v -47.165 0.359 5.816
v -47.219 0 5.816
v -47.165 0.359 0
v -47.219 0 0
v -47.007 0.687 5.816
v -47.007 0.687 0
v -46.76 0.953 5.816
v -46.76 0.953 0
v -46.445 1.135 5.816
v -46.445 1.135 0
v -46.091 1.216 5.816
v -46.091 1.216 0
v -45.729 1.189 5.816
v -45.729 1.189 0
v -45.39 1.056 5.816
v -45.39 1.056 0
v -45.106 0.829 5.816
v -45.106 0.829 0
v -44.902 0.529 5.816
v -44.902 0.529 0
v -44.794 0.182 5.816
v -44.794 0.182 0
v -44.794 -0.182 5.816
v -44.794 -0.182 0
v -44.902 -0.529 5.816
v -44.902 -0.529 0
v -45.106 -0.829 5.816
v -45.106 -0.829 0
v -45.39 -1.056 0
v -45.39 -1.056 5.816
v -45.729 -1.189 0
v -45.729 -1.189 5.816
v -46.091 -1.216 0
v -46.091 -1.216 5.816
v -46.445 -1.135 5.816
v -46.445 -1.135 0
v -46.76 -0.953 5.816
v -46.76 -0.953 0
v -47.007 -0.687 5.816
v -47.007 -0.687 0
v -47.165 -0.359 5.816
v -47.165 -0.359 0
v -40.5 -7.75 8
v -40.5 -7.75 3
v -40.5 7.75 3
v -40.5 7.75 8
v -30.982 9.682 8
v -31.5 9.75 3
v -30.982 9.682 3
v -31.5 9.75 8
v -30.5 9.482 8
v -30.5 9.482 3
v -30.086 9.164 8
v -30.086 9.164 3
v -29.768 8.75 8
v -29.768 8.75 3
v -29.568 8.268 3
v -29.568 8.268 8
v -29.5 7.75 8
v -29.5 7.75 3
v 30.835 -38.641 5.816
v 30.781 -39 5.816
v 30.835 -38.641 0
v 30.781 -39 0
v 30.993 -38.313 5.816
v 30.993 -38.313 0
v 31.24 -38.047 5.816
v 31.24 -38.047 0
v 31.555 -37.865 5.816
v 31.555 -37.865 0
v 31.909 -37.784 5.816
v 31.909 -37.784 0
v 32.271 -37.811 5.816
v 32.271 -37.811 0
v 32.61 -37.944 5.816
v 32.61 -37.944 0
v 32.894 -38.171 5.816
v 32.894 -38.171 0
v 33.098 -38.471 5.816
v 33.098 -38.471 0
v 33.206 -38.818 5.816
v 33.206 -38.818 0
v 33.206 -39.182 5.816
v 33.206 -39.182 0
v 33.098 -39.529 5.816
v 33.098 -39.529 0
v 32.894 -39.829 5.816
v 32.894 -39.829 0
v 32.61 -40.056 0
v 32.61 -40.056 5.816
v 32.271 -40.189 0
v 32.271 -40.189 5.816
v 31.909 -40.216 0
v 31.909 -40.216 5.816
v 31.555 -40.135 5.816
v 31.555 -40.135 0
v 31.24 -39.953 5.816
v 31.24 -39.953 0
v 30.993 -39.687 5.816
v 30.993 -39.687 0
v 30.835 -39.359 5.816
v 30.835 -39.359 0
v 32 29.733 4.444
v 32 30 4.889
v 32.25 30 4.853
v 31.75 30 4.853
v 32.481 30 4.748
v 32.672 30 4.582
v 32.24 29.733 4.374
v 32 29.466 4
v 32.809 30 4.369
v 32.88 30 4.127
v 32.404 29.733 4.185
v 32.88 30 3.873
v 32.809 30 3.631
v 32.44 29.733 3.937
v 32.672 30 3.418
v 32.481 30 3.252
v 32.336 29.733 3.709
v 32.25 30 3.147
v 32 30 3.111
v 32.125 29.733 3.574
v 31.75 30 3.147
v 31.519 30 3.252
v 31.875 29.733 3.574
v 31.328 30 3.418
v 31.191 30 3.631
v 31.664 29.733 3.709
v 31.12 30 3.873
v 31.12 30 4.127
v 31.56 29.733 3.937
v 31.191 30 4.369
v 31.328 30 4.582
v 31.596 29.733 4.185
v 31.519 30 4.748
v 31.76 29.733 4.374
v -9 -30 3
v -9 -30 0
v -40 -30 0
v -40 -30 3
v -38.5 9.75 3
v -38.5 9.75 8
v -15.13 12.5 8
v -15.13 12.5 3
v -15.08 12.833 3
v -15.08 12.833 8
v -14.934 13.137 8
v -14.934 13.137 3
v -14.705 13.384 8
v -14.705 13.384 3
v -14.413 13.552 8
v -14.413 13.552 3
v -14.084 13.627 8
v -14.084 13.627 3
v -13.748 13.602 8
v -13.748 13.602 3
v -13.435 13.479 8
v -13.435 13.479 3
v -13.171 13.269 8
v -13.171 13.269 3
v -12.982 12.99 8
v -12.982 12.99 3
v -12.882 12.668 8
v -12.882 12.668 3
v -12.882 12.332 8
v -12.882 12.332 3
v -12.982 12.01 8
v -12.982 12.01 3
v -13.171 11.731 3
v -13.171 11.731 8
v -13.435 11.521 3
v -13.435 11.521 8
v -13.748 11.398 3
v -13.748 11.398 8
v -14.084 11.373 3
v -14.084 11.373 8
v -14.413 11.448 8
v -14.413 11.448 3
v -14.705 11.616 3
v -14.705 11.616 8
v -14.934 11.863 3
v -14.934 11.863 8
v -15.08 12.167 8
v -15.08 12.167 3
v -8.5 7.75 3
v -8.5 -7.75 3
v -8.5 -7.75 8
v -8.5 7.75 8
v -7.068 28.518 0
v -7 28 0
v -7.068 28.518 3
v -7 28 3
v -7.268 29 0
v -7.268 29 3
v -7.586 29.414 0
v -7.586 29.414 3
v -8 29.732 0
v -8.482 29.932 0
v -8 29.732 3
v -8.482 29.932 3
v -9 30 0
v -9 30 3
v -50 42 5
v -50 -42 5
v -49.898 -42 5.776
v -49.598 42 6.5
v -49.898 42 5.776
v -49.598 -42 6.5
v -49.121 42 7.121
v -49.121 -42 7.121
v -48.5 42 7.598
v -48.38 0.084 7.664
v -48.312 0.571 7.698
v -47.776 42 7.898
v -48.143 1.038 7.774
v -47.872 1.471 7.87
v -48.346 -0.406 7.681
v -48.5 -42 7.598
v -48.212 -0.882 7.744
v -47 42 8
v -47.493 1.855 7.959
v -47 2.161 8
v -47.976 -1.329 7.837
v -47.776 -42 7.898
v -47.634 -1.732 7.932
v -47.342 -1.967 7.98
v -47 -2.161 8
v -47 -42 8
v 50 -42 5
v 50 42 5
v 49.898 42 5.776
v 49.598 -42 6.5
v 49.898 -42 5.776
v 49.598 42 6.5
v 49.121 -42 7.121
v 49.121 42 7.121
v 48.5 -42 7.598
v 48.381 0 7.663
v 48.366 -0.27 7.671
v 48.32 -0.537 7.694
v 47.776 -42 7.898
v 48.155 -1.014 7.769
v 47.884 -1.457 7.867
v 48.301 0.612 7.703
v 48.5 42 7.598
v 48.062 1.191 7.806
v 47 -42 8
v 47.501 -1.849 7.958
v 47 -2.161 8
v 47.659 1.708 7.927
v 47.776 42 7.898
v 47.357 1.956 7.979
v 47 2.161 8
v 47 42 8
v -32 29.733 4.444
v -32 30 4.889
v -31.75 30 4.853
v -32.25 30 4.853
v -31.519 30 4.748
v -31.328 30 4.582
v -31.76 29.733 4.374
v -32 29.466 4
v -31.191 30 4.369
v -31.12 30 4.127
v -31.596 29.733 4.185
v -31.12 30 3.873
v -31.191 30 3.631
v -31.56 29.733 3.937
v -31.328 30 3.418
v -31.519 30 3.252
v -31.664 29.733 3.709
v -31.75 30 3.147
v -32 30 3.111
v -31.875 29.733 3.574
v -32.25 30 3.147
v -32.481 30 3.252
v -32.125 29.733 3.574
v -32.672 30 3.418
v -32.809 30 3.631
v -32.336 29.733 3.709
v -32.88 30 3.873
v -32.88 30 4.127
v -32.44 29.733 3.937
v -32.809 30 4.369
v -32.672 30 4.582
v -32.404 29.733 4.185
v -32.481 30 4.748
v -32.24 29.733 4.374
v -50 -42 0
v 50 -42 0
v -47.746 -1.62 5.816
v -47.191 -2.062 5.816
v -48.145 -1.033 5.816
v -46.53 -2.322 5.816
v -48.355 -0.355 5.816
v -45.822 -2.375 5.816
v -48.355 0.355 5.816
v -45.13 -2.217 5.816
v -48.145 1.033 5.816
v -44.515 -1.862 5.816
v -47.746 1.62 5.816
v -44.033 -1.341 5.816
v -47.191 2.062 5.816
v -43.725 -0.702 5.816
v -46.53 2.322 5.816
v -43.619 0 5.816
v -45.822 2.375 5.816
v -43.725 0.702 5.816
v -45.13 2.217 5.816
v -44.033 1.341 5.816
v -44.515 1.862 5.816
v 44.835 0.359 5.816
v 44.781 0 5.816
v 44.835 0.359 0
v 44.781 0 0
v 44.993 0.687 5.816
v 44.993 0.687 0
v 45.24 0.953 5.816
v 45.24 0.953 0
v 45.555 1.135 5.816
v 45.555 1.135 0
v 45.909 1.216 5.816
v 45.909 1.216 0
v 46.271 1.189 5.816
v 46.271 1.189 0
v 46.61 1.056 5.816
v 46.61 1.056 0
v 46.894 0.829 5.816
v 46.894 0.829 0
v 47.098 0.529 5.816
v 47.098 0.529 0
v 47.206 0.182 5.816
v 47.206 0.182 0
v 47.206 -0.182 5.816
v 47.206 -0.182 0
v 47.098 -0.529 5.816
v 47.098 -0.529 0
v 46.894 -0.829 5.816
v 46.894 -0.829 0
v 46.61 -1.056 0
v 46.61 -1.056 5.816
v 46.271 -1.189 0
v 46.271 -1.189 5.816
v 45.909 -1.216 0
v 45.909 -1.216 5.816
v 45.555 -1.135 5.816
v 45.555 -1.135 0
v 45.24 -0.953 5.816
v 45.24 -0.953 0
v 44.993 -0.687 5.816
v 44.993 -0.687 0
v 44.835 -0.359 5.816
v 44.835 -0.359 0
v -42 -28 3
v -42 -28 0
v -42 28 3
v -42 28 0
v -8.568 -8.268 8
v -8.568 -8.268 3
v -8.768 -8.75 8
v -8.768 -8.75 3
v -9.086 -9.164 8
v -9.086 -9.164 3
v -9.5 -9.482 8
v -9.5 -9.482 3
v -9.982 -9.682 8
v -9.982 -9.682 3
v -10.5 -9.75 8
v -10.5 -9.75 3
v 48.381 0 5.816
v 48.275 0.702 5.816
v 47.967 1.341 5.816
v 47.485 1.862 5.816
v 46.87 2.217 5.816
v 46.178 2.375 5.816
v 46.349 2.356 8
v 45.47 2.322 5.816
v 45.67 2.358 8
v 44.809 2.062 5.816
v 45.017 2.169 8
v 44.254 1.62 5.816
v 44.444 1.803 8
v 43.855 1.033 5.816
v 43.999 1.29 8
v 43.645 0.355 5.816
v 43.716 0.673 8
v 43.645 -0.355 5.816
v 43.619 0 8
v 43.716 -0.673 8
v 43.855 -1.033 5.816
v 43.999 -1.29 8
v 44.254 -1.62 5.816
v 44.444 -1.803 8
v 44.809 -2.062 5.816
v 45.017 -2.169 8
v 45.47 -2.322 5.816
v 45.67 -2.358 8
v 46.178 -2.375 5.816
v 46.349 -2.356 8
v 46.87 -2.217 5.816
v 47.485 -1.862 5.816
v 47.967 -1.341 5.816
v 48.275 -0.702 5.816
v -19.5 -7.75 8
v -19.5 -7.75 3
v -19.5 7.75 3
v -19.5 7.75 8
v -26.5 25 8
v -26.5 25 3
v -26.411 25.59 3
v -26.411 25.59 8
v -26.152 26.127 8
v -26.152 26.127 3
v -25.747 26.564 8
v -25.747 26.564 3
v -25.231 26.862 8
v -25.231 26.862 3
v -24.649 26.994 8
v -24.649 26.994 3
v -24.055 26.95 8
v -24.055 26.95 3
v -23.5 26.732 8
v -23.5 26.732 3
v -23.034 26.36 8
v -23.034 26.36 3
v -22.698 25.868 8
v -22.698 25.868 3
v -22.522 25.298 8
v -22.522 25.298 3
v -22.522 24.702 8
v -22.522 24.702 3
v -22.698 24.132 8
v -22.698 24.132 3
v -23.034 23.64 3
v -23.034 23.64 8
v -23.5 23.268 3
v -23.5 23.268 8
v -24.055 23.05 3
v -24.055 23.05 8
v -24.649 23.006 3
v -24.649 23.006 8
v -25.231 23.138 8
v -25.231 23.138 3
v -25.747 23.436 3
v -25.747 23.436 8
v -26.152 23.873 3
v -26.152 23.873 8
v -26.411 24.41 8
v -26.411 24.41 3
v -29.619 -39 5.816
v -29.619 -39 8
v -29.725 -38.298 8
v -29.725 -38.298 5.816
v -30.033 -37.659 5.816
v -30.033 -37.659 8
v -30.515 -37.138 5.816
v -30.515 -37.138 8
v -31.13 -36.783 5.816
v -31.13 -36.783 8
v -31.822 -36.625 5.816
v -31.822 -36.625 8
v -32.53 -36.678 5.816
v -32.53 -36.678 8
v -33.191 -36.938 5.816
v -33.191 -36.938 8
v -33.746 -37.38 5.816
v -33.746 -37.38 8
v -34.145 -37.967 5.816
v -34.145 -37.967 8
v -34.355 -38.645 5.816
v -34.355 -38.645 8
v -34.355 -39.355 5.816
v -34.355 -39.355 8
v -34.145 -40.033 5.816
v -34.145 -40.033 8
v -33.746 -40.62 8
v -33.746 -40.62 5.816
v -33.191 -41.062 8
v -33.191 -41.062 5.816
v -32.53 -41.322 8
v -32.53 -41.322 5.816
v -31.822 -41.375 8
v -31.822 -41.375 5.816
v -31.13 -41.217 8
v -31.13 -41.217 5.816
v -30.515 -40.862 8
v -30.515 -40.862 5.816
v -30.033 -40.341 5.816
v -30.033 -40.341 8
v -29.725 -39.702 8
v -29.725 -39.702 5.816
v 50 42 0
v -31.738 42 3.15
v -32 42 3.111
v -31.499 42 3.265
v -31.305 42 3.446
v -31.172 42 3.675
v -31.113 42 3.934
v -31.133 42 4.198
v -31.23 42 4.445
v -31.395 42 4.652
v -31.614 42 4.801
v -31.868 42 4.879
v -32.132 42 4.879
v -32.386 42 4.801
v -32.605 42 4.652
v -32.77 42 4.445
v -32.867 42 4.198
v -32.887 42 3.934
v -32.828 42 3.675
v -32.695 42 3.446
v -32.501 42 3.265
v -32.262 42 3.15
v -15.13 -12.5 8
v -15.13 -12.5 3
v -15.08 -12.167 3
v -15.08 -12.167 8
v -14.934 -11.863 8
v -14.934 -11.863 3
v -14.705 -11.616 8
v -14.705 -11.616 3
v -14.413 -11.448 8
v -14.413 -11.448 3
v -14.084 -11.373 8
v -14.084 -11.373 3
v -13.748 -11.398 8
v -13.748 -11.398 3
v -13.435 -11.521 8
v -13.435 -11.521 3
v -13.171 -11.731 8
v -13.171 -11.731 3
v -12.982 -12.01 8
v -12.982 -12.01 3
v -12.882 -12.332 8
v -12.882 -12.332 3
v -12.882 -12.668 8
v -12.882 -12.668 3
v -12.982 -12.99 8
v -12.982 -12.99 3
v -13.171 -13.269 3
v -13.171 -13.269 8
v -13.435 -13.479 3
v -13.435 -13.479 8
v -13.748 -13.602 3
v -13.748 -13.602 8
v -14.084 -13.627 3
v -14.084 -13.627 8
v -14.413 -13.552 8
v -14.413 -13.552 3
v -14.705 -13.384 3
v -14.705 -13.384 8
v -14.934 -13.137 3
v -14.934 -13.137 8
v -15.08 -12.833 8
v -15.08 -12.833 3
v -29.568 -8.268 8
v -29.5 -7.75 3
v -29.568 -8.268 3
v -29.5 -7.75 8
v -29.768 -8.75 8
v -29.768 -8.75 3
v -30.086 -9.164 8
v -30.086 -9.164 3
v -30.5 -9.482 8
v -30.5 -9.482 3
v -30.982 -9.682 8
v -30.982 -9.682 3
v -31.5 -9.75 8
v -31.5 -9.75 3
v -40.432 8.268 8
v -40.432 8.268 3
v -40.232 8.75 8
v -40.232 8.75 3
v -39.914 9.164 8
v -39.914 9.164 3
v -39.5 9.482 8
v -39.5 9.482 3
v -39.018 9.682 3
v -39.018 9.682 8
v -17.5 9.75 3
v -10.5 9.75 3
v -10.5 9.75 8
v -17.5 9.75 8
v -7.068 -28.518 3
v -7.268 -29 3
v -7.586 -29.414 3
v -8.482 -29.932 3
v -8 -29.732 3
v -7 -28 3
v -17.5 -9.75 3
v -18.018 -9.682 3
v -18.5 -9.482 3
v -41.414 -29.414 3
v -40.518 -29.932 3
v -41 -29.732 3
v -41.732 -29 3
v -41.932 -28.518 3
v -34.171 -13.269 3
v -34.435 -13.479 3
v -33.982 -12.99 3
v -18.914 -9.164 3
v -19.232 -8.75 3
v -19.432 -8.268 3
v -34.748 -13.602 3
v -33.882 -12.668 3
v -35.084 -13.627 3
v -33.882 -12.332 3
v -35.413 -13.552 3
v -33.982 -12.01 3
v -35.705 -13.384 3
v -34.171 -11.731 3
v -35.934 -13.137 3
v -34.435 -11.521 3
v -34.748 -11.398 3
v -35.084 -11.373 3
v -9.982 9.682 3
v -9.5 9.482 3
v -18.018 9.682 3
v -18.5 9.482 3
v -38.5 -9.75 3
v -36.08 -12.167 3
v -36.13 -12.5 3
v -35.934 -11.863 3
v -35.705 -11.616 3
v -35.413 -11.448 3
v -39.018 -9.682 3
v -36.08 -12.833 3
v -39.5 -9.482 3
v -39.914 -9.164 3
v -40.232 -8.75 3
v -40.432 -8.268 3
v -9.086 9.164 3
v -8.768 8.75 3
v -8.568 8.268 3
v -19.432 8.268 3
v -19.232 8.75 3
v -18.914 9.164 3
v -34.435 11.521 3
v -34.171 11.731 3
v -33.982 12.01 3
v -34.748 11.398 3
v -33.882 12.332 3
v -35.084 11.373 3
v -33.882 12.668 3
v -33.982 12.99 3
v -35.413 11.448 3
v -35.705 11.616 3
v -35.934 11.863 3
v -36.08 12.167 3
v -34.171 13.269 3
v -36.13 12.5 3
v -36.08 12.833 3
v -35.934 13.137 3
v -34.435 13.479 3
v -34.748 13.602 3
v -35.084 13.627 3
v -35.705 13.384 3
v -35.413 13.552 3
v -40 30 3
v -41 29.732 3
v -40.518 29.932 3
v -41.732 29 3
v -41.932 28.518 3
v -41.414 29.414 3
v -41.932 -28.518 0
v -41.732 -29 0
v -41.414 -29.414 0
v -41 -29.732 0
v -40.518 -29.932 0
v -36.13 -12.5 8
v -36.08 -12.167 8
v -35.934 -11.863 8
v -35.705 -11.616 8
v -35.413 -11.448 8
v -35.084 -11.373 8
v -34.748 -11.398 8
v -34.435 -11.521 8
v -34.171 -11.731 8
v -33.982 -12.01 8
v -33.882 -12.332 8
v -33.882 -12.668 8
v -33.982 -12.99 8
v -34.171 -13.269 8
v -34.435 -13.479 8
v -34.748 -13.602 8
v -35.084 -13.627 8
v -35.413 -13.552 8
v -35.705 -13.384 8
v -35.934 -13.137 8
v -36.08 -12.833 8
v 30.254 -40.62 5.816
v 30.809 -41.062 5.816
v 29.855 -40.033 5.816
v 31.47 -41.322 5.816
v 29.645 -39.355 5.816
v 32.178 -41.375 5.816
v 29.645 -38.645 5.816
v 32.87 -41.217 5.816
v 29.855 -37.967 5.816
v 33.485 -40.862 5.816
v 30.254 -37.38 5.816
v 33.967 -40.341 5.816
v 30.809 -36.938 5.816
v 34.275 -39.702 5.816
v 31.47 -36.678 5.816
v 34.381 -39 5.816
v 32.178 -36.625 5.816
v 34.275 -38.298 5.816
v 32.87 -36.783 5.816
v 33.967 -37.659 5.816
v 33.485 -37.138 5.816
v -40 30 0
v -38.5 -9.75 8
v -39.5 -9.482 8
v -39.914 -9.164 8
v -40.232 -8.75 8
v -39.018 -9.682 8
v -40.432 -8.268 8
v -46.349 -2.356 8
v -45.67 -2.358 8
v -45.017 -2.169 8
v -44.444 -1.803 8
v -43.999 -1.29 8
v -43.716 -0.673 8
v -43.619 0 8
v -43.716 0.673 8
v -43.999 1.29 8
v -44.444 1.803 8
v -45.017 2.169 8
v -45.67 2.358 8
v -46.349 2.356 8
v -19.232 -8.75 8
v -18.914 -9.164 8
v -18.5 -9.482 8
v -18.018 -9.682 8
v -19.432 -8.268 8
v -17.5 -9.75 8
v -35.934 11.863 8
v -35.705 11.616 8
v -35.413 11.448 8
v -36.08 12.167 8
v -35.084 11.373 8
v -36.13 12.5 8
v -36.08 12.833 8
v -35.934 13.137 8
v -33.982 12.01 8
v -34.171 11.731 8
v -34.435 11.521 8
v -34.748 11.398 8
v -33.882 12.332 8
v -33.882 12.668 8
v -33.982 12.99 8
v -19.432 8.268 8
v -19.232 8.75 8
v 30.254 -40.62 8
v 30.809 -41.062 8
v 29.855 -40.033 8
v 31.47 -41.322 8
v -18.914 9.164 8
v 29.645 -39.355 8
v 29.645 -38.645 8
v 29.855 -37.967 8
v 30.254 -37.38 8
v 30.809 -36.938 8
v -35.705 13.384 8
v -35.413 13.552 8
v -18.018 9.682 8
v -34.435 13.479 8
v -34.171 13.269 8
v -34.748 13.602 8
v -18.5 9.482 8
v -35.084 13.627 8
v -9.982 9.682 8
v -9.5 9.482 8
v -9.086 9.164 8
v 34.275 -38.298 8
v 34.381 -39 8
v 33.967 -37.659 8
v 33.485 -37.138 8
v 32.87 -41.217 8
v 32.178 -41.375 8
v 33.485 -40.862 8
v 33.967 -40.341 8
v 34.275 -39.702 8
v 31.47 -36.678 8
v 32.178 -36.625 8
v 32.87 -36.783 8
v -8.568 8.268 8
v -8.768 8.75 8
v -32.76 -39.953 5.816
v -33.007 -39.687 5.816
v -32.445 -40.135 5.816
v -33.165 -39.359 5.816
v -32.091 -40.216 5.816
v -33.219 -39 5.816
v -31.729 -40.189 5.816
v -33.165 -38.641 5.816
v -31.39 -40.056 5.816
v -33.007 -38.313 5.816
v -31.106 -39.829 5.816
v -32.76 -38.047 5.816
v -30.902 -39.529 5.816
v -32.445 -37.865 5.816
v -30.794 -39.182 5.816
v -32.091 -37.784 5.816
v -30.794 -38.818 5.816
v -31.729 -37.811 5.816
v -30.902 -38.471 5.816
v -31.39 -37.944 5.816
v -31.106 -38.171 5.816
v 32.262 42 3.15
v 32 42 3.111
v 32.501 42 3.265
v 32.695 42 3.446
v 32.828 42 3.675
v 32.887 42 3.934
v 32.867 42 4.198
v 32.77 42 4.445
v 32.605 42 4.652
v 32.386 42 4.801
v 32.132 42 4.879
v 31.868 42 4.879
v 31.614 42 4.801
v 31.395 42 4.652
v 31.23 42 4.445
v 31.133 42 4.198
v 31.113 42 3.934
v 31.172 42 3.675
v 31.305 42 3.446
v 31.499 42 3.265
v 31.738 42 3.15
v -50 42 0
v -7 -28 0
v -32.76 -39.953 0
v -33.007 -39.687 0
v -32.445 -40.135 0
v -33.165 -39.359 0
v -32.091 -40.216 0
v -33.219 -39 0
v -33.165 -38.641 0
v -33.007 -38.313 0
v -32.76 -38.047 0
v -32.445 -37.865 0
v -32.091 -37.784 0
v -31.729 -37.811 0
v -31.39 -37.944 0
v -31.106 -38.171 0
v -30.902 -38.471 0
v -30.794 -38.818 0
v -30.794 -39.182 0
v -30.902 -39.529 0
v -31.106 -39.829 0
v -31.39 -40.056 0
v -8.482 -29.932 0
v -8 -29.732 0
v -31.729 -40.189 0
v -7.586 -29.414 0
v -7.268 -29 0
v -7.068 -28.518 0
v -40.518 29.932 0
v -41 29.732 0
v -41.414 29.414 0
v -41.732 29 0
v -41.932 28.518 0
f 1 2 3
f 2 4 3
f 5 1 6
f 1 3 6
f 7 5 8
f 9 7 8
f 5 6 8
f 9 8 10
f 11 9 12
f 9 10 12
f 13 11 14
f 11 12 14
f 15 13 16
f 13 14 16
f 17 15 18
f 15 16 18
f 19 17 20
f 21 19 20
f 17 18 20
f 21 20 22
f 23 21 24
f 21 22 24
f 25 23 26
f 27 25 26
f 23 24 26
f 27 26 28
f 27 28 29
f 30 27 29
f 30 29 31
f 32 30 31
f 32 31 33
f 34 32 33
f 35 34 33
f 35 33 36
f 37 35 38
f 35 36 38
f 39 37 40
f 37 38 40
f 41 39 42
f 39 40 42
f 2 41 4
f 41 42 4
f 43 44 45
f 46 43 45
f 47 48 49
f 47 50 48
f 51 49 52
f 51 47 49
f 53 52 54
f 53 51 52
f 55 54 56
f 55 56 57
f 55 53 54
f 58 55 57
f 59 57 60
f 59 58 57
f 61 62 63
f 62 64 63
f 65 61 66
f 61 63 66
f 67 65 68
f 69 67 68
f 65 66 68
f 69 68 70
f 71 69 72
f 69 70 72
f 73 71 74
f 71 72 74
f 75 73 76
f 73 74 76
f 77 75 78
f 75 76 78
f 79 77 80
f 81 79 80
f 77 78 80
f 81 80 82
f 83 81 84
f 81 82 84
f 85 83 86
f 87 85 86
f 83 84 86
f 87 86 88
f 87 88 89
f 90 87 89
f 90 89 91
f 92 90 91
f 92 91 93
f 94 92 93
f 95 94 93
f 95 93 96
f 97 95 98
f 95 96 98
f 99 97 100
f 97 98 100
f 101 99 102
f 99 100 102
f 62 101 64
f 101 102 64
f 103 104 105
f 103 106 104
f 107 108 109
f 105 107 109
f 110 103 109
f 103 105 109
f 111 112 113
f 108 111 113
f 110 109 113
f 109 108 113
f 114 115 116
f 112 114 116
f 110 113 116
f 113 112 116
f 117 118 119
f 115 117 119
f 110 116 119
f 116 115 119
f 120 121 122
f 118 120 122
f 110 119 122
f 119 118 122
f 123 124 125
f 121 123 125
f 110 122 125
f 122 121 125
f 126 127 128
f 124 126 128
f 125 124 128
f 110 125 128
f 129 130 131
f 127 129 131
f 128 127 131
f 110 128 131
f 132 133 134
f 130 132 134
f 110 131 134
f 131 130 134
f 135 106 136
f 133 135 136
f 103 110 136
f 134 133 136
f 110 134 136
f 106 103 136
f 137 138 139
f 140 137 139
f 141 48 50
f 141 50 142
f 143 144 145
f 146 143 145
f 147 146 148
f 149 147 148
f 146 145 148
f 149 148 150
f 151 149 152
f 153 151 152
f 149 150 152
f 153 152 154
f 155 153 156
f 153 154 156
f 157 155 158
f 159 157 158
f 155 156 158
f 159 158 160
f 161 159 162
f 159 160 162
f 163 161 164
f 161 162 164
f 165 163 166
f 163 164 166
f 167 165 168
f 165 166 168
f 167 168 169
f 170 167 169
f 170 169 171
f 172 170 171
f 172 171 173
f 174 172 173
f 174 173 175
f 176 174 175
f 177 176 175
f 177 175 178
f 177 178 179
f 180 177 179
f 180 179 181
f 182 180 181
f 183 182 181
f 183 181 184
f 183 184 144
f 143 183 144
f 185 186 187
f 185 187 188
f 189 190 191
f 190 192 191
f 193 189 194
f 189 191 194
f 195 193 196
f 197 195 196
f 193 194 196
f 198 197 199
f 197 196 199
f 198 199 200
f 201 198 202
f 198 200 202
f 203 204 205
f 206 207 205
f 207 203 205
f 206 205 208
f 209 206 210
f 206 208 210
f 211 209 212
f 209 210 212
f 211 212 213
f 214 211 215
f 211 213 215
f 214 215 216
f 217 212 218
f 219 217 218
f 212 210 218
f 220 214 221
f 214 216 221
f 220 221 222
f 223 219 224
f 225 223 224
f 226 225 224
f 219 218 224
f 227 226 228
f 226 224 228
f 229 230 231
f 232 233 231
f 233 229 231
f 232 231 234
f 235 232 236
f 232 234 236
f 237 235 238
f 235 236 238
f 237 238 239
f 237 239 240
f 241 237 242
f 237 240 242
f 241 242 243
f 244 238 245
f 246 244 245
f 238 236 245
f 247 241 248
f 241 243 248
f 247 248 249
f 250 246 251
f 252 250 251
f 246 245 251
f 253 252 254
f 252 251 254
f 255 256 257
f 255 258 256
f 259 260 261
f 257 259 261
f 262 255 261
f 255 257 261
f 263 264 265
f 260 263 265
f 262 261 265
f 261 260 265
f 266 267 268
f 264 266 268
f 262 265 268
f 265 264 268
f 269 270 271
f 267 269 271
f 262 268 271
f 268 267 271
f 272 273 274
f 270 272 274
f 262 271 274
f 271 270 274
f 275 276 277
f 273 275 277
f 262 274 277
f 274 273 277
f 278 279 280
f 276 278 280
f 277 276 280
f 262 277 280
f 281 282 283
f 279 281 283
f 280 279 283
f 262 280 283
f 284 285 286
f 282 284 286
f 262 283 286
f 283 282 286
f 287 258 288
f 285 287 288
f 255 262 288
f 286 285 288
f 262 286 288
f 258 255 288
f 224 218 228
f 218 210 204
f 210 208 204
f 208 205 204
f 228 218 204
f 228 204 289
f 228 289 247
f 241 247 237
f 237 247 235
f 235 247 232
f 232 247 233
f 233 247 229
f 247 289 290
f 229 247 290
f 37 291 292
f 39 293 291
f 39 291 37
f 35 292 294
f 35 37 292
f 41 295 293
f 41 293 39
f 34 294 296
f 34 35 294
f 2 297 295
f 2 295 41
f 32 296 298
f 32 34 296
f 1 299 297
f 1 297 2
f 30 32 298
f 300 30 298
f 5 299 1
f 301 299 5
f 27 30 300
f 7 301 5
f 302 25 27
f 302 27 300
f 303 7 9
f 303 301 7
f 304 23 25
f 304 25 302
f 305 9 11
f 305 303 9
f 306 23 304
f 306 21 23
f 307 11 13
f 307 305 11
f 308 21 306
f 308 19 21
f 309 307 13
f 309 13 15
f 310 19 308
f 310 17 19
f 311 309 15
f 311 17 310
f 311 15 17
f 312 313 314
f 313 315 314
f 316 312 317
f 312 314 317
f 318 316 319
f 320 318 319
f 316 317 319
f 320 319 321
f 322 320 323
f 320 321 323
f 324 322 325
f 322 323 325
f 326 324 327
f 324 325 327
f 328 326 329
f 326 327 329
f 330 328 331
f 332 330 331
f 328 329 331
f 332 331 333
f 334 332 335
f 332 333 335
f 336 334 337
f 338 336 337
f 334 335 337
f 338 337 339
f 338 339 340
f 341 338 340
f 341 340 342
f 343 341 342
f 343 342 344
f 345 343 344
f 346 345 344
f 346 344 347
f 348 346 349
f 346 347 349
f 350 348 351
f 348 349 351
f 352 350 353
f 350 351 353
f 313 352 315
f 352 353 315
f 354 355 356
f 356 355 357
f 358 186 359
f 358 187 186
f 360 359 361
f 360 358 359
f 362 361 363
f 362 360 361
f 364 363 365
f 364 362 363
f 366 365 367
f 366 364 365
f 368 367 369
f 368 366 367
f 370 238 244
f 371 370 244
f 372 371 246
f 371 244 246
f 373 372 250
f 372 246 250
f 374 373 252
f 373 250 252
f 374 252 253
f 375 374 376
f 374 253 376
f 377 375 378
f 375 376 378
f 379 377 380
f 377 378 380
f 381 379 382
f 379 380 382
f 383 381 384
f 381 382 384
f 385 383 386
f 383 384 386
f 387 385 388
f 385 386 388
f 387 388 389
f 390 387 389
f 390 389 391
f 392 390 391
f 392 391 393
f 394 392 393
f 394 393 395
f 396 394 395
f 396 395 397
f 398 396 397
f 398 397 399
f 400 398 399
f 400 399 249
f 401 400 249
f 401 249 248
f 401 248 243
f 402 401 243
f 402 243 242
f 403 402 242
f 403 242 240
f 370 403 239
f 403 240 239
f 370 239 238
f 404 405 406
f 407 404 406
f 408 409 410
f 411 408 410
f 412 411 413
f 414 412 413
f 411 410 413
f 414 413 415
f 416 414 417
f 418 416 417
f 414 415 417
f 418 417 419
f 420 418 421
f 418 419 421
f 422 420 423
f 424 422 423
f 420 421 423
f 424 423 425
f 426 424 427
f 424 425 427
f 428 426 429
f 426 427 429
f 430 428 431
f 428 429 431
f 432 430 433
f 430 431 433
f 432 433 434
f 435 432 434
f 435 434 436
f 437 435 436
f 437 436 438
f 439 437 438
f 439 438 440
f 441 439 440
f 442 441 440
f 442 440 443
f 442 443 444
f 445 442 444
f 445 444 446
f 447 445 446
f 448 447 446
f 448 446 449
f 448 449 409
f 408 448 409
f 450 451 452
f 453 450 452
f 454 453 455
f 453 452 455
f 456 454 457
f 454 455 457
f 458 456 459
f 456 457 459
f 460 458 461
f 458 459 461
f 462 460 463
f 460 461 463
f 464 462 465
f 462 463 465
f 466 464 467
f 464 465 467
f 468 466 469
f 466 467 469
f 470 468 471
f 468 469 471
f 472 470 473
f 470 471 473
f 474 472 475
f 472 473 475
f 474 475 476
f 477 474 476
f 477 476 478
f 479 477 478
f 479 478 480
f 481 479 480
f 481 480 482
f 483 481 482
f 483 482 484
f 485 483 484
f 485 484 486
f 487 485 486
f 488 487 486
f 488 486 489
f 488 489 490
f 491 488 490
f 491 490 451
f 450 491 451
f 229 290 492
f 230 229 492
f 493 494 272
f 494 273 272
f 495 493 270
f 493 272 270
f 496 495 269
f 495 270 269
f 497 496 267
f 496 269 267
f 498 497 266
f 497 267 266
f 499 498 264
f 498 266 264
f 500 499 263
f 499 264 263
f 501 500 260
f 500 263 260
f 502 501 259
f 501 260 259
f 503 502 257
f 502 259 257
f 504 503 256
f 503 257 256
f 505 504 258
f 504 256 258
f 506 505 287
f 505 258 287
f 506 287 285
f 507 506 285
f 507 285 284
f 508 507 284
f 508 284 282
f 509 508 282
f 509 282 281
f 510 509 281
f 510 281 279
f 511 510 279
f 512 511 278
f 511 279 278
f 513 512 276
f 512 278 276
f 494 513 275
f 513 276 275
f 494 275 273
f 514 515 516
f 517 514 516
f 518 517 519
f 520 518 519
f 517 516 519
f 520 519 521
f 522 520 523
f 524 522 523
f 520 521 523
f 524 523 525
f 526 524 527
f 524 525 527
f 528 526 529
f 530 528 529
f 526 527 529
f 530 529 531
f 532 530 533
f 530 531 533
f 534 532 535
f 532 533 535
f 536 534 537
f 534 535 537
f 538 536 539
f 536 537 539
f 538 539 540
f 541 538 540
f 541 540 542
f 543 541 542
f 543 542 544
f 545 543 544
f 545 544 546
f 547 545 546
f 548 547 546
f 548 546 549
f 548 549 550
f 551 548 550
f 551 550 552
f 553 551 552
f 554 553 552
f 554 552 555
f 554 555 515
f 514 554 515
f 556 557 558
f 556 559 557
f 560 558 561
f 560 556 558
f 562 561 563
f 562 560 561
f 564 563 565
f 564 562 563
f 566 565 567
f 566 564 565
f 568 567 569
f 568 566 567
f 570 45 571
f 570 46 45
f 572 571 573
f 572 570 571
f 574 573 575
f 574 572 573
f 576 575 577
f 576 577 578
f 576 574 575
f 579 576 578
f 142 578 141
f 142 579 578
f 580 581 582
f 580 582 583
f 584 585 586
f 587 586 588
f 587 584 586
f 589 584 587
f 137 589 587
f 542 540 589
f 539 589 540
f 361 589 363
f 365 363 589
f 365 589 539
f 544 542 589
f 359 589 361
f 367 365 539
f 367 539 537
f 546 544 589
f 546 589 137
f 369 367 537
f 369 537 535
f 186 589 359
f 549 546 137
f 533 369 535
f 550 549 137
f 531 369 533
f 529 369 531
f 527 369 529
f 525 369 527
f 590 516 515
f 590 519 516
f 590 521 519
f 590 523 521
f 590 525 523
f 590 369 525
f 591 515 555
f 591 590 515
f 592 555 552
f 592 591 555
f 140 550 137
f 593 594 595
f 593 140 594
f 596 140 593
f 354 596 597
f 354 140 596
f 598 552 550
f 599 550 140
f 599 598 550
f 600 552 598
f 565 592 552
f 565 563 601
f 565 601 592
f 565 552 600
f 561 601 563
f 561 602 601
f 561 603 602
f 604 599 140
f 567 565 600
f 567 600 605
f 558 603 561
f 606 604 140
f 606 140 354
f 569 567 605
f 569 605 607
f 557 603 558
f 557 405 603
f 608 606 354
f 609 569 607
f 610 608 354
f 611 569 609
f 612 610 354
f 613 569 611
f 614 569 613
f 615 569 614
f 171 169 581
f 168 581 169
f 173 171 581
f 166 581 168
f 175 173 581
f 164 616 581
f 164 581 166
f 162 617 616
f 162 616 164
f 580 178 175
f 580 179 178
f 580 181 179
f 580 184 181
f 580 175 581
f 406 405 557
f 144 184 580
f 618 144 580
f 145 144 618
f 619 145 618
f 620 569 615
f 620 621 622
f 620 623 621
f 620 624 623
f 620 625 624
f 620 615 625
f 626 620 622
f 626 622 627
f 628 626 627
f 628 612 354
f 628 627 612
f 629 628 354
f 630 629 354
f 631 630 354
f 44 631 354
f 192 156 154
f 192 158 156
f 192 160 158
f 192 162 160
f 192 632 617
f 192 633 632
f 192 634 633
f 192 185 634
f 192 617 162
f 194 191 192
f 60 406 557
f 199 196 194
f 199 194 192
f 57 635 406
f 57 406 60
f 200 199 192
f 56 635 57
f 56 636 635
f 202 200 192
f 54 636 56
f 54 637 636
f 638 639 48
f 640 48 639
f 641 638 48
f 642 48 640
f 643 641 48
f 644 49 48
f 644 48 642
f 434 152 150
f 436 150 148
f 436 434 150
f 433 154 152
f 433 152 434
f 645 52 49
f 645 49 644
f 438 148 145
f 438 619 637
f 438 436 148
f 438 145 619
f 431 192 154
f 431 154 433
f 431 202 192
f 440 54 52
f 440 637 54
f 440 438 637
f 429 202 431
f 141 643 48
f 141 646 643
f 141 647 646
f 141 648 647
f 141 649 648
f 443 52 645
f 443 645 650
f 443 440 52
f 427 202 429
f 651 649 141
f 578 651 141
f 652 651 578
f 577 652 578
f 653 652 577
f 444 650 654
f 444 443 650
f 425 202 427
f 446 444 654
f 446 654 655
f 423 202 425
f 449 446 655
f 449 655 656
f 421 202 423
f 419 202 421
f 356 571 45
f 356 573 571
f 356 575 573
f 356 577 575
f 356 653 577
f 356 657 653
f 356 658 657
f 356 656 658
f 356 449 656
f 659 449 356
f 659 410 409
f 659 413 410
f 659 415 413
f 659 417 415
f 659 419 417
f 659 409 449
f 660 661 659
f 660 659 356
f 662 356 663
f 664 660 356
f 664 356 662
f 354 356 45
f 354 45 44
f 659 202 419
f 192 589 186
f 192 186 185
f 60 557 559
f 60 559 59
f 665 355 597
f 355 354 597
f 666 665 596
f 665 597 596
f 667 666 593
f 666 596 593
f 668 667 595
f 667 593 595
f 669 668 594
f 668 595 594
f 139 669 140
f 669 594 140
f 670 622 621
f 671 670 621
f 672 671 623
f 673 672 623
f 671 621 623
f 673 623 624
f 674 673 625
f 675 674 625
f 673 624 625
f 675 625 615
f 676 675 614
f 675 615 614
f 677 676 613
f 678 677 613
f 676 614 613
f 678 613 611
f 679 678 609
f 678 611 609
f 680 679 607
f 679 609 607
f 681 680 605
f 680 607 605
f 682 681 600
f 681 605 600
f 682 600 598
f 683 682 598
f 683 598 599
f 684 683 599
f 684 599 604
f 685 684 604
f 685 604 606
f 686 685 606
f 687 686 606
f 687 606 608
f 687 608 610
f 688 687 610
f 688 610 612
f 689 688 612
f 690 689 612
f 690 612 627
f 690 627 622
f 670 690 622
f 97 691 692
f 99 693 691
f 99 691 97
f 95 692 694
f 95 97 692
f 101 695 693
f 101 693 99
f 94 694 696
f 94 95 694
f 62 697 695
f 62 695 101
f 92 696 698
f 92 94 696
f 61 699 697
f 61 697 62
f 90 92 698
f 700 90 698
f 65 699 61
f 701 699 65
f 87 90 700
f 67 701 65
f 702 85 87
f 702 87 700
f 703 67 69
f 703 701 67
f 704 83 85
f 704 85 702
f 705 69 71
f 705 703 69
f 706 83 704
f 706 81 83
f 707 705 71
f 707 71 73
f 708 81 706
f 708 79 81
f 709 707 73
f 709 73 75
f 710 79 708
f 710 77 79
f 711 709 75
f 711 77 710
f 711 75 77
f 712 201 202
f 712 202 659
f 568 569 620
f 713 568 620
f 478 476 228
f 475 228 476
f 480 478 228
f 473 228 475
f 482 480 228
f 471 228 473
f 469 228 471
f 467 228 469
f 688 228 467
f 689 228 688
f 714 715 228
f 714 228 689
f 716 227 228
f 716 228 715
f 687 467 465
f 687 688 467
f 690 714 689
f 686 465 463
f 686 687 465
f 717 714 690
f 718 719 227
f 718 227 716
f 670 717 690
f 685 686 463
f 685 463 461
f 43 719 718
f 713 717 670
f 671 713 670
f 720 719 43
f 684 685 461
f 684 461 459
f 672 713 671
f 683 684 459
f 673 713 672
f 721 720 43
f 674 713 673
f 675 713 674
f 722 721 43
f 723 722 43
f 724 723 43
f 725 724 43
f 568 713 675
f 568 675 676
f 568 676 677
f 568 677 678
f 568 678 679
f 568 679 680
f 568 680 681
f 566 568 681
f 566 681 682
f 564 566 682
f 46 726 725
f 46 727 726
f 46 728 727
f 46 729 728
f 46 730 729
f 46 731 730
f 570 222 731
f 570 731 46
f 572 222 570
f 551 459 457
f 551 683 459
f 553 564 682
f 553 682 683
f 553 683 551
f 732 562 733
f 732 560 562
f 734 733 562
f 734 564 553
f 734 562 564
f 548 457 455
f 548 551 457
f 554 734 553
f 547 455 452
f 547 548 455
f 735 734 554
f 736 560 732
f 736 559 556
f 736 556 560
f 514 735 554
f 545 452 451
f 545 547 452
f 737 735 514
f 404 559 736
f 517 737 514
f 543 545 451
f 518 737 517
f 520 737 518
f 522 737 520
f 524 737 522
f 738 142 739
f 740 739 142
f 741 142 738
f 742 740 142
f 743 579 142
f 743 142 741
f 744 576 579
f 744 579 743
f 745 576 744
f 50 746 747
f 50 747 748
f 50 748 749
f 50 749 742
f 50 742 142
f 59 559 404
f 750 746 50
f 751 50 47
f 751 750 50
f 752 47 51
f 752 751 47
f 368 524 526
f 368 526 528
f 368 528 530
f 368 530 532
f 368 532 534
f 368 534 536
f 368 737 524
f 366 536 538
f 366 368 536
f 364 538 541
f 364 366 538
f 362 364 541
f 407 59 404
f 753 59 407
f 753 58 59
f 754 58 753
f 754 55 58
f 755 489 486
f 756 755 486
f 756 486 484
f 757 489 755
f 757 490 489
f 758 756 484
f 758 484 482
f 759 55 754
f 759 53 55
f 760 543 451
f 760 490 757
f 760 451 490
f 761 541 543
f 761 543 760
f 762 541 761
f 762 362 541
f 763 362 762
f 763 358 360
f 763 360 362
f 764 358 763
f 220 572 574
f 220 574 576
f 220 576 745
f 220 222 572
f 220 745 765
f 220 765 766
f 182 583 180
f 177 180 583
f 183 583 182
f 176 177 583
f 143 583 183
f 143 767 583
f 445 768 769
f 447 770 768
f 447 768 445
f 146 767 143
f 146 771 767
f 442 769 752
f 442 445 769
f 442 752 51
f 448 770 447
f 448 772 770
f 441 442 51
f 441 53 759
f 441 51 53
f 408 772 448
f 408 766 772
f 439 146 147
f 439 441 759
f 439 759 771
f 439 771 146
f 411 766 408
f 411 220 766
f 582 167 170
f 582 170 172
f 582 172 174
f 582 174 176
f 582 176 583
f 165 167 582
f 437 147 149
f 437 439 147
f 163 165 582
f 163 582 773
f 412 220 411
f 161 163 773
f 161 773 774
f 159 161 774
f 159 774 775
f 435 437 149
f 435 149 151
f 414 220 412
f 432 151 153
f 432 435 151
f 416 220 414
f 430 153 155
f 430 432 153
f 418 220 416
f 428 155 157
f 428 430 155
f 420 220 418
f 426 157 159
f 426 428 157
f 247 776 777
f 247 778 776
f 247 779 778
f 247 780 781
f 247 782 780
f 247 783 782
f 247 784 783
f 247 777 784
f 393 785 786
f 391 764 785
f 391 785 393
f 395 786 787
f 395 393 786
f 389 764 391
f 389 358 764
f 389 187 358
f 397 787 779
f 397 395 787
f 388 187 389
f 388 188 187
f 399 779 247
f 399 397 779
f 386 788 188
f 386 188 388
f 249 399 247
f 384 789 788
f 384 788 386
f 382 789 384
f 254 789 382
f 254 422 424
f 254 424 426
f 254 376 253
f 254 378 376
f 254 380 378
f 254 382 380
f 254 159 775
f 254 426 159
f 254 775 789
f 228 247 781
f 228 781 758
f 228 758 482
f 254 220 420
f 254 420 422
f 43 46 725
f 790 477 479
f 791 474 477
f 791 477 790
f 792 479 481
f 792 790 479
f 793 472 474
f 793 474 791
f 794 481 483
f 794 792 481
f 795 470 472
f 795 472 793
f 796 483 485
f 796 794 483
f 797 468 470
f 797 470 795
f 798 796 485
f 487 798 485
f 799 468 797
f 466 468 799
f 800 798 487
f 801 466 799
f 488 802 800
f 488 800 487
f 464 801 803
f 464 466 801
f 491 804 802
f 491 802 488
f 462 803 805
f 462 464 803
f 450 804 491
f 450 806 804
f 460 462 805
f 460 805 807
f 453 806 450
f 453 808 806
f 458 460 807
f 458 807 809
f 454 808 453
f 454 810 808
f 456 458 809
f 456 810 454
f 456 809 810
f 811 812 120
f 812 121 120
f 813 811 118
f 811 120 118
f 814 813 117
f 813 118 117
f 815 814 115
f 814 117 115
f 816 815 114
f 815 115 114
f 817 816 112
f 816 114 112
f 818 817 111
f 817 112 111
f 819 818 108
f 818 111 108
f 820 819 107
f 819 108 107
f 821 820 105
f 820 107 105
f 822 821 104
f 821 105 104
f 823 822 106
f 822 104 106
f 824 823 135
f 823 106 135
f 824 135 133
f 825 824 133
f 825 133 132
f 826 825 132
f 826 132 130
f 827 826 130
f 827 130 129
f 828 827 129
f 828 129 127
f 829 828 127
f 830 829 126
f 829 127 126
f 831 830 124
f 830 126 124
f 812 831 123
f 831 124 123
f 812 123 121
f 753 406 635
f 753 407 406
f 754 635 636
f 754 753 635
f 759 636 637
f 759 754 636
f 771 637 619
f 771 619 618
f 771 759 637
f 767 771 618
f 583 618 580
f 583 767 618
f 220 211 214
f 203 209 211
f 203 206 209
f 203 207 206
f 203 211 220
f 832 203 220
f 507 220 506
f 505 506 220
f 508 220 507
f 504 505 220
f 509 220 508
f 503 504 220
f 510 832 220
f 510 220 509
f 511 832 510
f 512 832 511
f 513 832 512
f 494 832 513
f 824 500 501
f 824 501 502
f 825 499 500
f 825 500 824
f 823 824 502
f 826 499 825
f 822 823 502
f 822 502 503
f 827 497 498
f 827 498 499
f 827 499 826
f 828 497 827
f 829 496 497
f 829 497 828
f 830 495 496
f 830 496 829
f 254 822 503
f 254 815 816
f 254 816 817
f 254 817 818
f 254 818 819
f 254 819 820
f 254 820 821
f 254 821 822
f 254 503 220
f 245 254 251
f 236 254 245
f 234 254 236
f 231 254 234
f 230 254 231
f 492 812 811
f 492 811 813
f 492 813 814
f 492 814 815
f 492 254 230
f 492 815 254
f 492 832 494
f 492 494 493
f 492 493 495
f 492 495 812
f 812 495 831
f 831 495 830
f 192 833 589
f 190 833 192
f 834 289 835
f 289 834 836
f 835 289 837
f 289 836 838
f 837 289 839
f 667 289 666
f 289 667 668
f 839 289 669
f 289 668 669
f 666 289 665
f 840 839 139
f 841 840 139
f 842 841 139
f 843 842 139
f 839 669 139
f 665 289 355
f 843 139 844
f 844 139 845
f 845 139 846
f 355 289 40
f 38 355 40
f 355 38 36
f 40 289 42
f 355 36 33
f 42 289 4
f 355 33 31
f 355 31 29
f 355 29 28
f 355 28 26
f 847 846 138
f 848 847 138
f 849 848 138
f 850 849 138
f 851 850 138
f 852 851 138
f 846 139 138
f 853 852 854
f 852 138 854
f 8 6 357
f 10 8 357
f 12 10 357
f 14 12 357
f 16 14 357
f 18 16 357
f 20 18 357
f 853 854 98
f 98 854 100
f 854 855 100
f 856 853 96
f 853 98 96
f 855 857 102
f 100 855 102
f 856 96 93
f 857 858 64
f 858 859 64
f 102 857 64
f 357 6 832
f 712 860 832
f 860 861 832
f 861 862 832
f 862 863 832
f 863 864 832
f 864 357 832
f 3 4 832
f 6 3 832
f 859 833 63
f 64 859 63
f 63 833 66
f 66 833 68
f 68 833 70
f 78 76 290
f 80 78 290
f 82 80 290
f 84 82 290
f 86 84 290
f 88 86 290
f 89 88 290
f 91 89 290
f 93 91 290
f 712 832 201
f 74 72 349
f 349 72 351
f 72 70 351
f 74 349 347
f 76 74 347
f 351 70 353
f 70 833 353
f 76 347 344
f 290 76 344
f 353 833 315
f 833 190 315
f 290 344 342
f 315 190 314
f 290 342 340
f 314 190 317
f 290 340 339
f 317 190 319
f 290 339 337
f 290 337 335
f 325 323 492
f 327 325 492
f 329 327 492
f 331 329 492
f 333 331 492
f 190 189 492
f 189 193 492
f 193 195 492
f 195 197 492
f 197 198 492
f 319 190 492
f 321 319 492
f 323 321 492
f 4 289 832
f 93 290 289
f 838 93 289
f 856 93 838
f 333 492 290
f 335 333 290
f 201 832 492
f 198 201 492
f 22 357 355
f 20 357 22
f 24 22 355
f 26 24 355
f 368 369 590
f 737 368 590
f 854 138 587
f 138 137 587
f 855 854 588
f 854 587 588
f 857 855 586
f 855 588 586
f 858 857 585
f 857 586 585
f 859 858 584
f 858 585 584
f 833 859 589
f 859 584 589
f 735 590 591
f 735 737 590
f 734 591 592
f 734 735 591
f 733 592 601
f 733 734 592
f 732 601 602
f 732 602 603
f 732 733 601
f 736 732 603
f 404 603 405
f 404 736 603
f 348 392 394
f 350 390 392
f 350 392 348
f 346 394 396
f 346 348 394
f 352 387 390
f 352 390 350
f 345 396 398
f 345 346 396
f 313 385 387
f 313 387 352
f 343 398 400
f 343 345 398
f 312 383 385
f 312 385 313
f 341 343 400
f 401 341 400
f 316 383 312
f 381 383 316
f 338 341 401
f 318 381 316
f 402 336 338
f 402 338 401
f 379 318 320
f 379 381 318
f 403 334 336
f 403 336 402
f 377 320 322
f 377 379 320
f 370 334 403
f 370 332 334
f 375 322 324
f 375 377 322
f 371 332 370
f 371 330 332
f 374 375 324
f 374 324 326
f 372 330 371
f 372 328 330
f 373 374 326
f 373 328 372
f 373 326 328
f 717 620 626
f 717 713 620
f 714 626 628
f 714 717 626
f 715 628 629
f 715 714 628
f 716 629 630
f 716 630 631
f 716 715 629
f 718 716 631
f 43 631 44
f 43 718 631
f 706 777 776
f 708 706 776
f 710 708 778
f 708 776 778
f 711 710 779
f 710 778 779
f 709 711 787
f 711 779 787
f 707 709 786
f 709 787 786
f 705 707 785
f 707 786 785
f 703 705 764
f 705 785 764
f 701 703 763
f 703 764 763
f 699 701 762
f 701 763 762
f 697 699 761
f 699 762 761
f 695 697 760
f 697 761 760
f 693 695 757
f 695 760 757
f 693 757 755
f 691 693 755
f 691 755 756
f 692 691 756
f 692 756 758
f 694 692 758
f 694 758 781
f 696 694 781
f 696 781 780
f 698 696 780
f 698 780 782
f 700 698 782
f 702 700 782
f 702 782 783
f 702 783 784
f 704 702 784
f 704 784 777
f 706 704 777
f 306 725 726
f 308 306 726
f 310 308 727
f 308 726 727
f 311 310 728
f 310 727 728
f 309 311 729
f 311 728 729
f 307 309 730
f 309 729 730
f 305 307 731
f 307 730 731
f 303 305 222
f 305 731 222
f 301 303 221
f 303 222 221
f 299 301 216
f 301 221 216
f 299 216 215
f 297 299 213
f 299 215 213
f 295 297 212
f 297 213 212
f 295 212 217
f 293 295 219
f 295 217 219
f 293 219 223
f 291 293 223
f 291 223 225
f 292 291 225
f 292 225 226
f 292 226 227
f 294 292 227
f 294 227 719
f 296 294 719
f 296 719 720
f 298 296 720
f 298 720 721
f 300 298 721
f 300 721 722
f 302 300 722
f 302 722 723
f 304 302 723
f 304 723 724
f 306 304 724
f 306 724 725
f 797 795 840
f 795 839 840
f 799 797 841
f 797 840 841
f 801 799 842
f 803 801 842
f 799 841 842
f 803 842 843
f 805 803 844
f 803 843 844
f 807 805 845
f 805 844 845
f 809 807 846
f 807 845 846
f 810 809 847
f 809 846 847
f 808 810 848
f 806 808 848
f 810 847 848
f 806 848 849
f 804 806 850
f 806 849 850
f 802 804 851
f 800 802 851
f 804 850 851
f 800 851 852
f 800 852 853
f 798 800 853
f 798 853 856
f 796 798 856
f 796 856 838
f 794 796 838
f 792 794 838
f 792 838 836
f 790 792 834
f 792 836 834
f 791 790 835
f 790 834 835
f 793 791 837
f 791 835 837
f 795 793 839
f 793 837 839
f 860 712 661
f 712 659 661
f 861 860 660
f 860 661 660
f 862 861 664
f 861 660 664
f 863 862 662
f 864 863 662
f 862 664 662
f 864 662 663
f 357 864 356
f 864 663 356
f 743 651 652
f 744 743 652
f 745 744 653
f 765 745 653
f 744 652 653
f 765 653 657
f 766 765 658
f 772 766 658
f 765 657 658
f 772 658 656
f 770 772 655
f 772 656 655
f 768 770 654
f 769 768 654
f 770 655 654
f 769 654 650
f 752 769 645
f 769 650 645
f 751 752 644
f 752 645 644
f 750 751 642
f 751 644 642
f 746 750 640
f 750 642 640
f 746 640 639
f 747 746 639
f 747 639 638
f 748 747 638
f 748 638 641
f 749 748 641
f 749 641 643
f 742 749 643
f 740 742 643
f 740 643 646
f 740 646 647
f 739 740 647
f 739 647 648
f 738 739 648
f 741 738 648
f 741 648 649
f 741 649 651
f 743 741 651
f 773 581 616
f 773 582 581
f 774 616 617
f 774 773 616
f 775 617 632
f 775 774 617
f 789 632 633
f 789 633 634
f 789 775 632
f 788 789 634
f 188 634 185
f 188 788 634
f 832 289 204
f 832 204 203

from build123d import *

# Parameters (mm, degrees)
SKETCH1_W                                      = 100
SKETCH1_H                                      = 84
BOSS_EXTRUDE1_DEPTH                            = 8
CBORE_FOR_2_SOCKET_HEAD_CAP_SCREW1_D           = 2.4384
CBORE_FOR_2_SOCKET_HEAD_CAP_SCREW1_DEPTH       = 12.27
CBORE_FOR_2_SOCKET_HEAD_CAP_SCREW1_CBORE_D     = 4.7625
CBORE_FOR_2_SOCKET_HEAD_CAP_SCREW1_CBORE_DEPTH = 2.1844
CBORE_FOR_2_SOCKET_HEAD_CAP_SCREW1_TIP         = 0.732569267
CBORE_FOR_2_SOCKET_HEAD_CAP_SCREW2_D           = 2.4384
CBORE_FOR_2_SOCKET_HEAD_CAP_SCREW2_DEPTH       = 12.27
CBORE_FOR_2_SOCKET_HEAD_CAP_SCREW2_CBORE_D     = 4.7625
CBORE_FOR_2_SOCKET_HEAD_CAP_SCREW2_CBORE_DEPTH = 2.1844
CBORE_FOR_2_SOCKET_HEAD_CAP_SCREW2_TIP         = 0.732569267
F_2_56_TAPPED_HOLE1_D                          = 1.778
F_2_56_TAPPED_HOLE1_DEPTH                      = 12
F_2_56_TAPPED_HOLE1_TIP                        = 0.53416509
SKETCH12_W                                     = 35
SKETCH12_H                                     = 60
CUT_EXTRUDE3_DEPTH                             = 3
FILLET1_R                                      = 2
FILLET2_R                                      = 2
FILLET3_R                                      = 2
FILLET4_R                                      = 2
SKETCH17_W                                     = 11
SKETCH17_H                                     = 19.5
CUT_EXTRUDE4_DEPTH                             = 8
SKETCH16_W                                     = 11
SKETCH16_H                                     = 19.5
CUT_EXTRUDE5_DEPTH                             = 8
FILLET5_R                                      = 2
FILLET6_R                                      = 2
FILLET7_R                                      = 2
FILLET8_R                                      = 2
F_4_40_TAPPED_HOLE1_D                          = 2.2606
SKETCH21_R                                     = 2
CUT_EXTRUDE6_DEPTH                             = 8
FILLET9_R                                      = 3


with BuildPart() as part:
    # Sketch1 → Boss-Extrude1 (new body)
    with BuildSketch(Plane.XY):
        Rectangle(SKETCH1_W, SKETCH1_H)
    extrude(amount=BOSS_EXTRUDE1_DEPTH)

    # CBORE for #2 Socket Head Cap Screw1
    with Locations(Plane(origin=(-32, -39, 8), x_dir=(1, 0, 0), z_dir=(0, 0, 1))):
        with Locations((0, 0), (64, 0)):
            CounterBoreHole(CBORE_FOR_2_SOCKET_HEAD_CAP_SCREW1_D / 2, CBORE_FOR_2_SOCKET_HEAD_CAP_SCREW1_CBORE_D / 2, CBORE_FOR_2_SOCKET_HEAD_CAP_SCREW1_CBORE_DEPTH, depth=CBORE_FOR_2_SOCKET_HEAD_CAP_SCREW1_DEPTH)
            with Locations((0, 0, -(CBORE_FOR_2_SOCKET_HEAD_CAP_SCREW1_DEPTH + CBORE_FOR_2_SOCKET_HEAD_CAP_SCREW1_TIP / 2))):  # 118° drill point
                Cone(0, CBORE_FOR_2_SOCKET_HEAD_CAP_SCREW1_D / 2, CBORE_FOR_2_SOCKET_HEAD_CAP_SCREW1_TIP, mode=Mode.SUBTRACT)

    # CBORE for #2 Socket Head Cap Screw2
    with Locations(Plane(origin=(-46, 0, 8), x_dir=(1, 0, 0), z_dir=(0, 0, 1))):
        with Locations((0, 0), (92, 0)):
            CounterBoreHole(CBORE_FOR_2_SOCKET_HEAD_CAP_SCREW2_D / 2, CBORE_FOR_2_SOCKET_HEAD_CAP_SCREW2_CBORE_D / 2, CBORE_FOR_2_SOCKET_HEAD_CAP_SCREW2_CBORE_DEPTH, depth=CBORE_FOR_2_SOCKET_HEAD_CAP_SCREW2_DEPTH)
            with Locations((0, 0, -(CBORE_FOR_2_SOCKET_HEAD_CAP_SCREW2_DEPTH + CBORE_FOR_2_SOCKET_HEAD_CAP_SCREW2_TIP / 2))):  # 118° drill point
                Cone(0, CBORE_FOR_2_SOCKET_HEAD_CAP_SCREW2_D / 2, CBORE_FOR_2_SOCKET_HEAD_CAP_SCREW2_TIP, mode=Mode.SUBTRACT)

    # #2-56 Tapped Hole1
    with Locations(Plane(origin=(-32, 42, 4), x_dir=(0, 0, 1), z_dir=(0, 1, 0))):
        with Locations((0, 0), (0, 64)):
            Hole(F_2_56_TAPPED_HOLE1_D / 2, depth=F_2_56_TAPPED_HOLE1_DEPTH)
            with Locations((0, 0, -(F_2_56_TAPPED_HOLE1_DEPTH + F_2_56_TAPPED_HOLE1_TIP / 2))):  # 118° drill point
                Cone(0, F_2_56_TAPPED_HOLE1_D / 2, F_2_56_TAPPED_HOLE1_TIP, mode=Mode.SUBTRACT)

    # Sketch12 → Cut-Extrude3 (cut)
    with BuildSketch(Plane(origin=(0, 0, 0), x_dir=(-1, 0, 0), z_dir=(0, 0, -1))):
        with Locations((24.5, 0)):
            Rectangle(SKETCH12_W, SKETCH12_H)
    extrude(amount=-CUT_EXTRUDE3_DEPTH, mode=Mode.SUBTRACT)

    # Fillet1
    fillet1_edges = [part.edges().sort_by_distance(p)[0] for p in [
        (-7, 30, 1.5),
    ]]
    fillet(fillet1_edges, radius=FILLET1_R)

    # Fillet2
    fillet2_edges = [part.edges().sort_by_distance(p)[0] for p in [
        (-42, 30, 1.5),
    ]]
    fillet(fillet2_edges, radius=FILLET2_R)

    # Fillet3
    fillet3_edges = [part.edges().sort_by_distance(p)[0] for p in [
        (-42, -30, 1.5),
    ]]
    fillet(fillet3_edges, radius=FILLET3_R)

    # Fillet4
    fillet4_edges = [part.edges().sort_by_distance(p)[0] for p in [
        (-7, -30, 1.5),
    ]]
    fillet(fillet4_edges, radius=FILLET4_R)

    # Sketch17 → Cut-Extrude4 (cut)
    with BuildSketch(Plane(origin=(0, 0, 3), x_dir=(-1, 0, 0), z_dir=(0, 0, -1))):
        with Locations((35, 0)):
            Rectangle(SKETCH17_W, SKETCH17_H)
    extrude(amount=-CUT_EXTRUDE4_DEPTH, mode=Mode.SUBTRACT)

    # Sketch16 → Cut-Extrude5 (cut)
    with BuildSketch(Plane(origin=(0, 0, 3), x_dir=(-1, 0, 0), z_dir=(0, 0, -1))):
        with Locations((14, 0)):
            Rectangle(SKETCH16_W, SKETCH16_H)
    extrude(amount=-CUT_EXTRUDE5_DEPTH, mode=Mode.SUBTRACT)

    # Fillet5
    fillet5_edges = [part.edges().sort_by_distance(p)[0] for p in [
        (-40.5, 9.75, 5.5),
        (-19.5, 9.75, 5.5),
    ]]
    fillet(fillet5_edges, radius=FILLET5_R)

    # Fillet6
    fillet6_edges = [part.edges().sort_by_distance(p)[0] for p in [
        (-29.5, 9.75, 5.5),
        (-8.5, 9.75, 5.5),
    ]]
    fillet(fillet6_edges, radius=FILLET6_R)

    # Fillet7
    fillet7_edges = [part.edges().sort_by_distance(p)[0] for p in [
        (-29.5, -9.75, 5.5),
        (-8.5, -9.75, 5.5),
    ]]
    fillet(fillet7_edges, radius=FILLET7_R)

    # Fillet8
    fillet8_edges = [part.edges().sort_by_distance(p)[0] for p in [
        (-40.5, -9.75, 5.5),
        (-19.5, -9.75, 5.5),
    ]]
    fillet(fillet8_edges, radius=FILLET8_R)

    # #4-40 Tapped Hole1 (through all)
    with Locations(Plane(origin=(-35, 12.5, 8), x_dir=(1, 0, 0), z_dir=(0, 0, 1))):
        with Locations((0, 0), (0, -25), (21, -25), (21, 0)):
            Hole(F_4_40_TAPPED_HOLE1_D / 2)

    # Sketch21 → Cut-Extrude6 (cut)
    with BuildSketch(Plane(origin=(0, 0, 3), x_dir=(-1, 0, 0), z_dir=(0, 0, -1))):
        with Locations((24.5, 25)):
            Circle(SKETCH21_R)
    extrude(amount=-CUT_EXTRUDE6_DEPTH, mode=Mode.SUBTRACT)

    # Fillet9
    # the kernel refuses this fillet: 3 mm, written as the material it takes off along each edge
    with BuildSketch(Plane(origin=(-50, -49.5, 8), x_dir=(1, 0, 0), z_dir=(0, 1, 0)), Plane(origin=(50, 49.5, 8), x_dir=(-1, 0, 0), z_dir=(0, -1, 0))) as fillet9_piece_1:
        with BuildLine():
            CenterArc((FILLET9_R, FILLET9_R), FILLET9_R, 180, 90)
            Line((0, FILLET9_R), (0, 0))
            Line((0, 0), (FILLET9_R, 0))
        make_face()
    extrude(amount=99, mode=Mode.SUBTRACT)


solid = part.part
